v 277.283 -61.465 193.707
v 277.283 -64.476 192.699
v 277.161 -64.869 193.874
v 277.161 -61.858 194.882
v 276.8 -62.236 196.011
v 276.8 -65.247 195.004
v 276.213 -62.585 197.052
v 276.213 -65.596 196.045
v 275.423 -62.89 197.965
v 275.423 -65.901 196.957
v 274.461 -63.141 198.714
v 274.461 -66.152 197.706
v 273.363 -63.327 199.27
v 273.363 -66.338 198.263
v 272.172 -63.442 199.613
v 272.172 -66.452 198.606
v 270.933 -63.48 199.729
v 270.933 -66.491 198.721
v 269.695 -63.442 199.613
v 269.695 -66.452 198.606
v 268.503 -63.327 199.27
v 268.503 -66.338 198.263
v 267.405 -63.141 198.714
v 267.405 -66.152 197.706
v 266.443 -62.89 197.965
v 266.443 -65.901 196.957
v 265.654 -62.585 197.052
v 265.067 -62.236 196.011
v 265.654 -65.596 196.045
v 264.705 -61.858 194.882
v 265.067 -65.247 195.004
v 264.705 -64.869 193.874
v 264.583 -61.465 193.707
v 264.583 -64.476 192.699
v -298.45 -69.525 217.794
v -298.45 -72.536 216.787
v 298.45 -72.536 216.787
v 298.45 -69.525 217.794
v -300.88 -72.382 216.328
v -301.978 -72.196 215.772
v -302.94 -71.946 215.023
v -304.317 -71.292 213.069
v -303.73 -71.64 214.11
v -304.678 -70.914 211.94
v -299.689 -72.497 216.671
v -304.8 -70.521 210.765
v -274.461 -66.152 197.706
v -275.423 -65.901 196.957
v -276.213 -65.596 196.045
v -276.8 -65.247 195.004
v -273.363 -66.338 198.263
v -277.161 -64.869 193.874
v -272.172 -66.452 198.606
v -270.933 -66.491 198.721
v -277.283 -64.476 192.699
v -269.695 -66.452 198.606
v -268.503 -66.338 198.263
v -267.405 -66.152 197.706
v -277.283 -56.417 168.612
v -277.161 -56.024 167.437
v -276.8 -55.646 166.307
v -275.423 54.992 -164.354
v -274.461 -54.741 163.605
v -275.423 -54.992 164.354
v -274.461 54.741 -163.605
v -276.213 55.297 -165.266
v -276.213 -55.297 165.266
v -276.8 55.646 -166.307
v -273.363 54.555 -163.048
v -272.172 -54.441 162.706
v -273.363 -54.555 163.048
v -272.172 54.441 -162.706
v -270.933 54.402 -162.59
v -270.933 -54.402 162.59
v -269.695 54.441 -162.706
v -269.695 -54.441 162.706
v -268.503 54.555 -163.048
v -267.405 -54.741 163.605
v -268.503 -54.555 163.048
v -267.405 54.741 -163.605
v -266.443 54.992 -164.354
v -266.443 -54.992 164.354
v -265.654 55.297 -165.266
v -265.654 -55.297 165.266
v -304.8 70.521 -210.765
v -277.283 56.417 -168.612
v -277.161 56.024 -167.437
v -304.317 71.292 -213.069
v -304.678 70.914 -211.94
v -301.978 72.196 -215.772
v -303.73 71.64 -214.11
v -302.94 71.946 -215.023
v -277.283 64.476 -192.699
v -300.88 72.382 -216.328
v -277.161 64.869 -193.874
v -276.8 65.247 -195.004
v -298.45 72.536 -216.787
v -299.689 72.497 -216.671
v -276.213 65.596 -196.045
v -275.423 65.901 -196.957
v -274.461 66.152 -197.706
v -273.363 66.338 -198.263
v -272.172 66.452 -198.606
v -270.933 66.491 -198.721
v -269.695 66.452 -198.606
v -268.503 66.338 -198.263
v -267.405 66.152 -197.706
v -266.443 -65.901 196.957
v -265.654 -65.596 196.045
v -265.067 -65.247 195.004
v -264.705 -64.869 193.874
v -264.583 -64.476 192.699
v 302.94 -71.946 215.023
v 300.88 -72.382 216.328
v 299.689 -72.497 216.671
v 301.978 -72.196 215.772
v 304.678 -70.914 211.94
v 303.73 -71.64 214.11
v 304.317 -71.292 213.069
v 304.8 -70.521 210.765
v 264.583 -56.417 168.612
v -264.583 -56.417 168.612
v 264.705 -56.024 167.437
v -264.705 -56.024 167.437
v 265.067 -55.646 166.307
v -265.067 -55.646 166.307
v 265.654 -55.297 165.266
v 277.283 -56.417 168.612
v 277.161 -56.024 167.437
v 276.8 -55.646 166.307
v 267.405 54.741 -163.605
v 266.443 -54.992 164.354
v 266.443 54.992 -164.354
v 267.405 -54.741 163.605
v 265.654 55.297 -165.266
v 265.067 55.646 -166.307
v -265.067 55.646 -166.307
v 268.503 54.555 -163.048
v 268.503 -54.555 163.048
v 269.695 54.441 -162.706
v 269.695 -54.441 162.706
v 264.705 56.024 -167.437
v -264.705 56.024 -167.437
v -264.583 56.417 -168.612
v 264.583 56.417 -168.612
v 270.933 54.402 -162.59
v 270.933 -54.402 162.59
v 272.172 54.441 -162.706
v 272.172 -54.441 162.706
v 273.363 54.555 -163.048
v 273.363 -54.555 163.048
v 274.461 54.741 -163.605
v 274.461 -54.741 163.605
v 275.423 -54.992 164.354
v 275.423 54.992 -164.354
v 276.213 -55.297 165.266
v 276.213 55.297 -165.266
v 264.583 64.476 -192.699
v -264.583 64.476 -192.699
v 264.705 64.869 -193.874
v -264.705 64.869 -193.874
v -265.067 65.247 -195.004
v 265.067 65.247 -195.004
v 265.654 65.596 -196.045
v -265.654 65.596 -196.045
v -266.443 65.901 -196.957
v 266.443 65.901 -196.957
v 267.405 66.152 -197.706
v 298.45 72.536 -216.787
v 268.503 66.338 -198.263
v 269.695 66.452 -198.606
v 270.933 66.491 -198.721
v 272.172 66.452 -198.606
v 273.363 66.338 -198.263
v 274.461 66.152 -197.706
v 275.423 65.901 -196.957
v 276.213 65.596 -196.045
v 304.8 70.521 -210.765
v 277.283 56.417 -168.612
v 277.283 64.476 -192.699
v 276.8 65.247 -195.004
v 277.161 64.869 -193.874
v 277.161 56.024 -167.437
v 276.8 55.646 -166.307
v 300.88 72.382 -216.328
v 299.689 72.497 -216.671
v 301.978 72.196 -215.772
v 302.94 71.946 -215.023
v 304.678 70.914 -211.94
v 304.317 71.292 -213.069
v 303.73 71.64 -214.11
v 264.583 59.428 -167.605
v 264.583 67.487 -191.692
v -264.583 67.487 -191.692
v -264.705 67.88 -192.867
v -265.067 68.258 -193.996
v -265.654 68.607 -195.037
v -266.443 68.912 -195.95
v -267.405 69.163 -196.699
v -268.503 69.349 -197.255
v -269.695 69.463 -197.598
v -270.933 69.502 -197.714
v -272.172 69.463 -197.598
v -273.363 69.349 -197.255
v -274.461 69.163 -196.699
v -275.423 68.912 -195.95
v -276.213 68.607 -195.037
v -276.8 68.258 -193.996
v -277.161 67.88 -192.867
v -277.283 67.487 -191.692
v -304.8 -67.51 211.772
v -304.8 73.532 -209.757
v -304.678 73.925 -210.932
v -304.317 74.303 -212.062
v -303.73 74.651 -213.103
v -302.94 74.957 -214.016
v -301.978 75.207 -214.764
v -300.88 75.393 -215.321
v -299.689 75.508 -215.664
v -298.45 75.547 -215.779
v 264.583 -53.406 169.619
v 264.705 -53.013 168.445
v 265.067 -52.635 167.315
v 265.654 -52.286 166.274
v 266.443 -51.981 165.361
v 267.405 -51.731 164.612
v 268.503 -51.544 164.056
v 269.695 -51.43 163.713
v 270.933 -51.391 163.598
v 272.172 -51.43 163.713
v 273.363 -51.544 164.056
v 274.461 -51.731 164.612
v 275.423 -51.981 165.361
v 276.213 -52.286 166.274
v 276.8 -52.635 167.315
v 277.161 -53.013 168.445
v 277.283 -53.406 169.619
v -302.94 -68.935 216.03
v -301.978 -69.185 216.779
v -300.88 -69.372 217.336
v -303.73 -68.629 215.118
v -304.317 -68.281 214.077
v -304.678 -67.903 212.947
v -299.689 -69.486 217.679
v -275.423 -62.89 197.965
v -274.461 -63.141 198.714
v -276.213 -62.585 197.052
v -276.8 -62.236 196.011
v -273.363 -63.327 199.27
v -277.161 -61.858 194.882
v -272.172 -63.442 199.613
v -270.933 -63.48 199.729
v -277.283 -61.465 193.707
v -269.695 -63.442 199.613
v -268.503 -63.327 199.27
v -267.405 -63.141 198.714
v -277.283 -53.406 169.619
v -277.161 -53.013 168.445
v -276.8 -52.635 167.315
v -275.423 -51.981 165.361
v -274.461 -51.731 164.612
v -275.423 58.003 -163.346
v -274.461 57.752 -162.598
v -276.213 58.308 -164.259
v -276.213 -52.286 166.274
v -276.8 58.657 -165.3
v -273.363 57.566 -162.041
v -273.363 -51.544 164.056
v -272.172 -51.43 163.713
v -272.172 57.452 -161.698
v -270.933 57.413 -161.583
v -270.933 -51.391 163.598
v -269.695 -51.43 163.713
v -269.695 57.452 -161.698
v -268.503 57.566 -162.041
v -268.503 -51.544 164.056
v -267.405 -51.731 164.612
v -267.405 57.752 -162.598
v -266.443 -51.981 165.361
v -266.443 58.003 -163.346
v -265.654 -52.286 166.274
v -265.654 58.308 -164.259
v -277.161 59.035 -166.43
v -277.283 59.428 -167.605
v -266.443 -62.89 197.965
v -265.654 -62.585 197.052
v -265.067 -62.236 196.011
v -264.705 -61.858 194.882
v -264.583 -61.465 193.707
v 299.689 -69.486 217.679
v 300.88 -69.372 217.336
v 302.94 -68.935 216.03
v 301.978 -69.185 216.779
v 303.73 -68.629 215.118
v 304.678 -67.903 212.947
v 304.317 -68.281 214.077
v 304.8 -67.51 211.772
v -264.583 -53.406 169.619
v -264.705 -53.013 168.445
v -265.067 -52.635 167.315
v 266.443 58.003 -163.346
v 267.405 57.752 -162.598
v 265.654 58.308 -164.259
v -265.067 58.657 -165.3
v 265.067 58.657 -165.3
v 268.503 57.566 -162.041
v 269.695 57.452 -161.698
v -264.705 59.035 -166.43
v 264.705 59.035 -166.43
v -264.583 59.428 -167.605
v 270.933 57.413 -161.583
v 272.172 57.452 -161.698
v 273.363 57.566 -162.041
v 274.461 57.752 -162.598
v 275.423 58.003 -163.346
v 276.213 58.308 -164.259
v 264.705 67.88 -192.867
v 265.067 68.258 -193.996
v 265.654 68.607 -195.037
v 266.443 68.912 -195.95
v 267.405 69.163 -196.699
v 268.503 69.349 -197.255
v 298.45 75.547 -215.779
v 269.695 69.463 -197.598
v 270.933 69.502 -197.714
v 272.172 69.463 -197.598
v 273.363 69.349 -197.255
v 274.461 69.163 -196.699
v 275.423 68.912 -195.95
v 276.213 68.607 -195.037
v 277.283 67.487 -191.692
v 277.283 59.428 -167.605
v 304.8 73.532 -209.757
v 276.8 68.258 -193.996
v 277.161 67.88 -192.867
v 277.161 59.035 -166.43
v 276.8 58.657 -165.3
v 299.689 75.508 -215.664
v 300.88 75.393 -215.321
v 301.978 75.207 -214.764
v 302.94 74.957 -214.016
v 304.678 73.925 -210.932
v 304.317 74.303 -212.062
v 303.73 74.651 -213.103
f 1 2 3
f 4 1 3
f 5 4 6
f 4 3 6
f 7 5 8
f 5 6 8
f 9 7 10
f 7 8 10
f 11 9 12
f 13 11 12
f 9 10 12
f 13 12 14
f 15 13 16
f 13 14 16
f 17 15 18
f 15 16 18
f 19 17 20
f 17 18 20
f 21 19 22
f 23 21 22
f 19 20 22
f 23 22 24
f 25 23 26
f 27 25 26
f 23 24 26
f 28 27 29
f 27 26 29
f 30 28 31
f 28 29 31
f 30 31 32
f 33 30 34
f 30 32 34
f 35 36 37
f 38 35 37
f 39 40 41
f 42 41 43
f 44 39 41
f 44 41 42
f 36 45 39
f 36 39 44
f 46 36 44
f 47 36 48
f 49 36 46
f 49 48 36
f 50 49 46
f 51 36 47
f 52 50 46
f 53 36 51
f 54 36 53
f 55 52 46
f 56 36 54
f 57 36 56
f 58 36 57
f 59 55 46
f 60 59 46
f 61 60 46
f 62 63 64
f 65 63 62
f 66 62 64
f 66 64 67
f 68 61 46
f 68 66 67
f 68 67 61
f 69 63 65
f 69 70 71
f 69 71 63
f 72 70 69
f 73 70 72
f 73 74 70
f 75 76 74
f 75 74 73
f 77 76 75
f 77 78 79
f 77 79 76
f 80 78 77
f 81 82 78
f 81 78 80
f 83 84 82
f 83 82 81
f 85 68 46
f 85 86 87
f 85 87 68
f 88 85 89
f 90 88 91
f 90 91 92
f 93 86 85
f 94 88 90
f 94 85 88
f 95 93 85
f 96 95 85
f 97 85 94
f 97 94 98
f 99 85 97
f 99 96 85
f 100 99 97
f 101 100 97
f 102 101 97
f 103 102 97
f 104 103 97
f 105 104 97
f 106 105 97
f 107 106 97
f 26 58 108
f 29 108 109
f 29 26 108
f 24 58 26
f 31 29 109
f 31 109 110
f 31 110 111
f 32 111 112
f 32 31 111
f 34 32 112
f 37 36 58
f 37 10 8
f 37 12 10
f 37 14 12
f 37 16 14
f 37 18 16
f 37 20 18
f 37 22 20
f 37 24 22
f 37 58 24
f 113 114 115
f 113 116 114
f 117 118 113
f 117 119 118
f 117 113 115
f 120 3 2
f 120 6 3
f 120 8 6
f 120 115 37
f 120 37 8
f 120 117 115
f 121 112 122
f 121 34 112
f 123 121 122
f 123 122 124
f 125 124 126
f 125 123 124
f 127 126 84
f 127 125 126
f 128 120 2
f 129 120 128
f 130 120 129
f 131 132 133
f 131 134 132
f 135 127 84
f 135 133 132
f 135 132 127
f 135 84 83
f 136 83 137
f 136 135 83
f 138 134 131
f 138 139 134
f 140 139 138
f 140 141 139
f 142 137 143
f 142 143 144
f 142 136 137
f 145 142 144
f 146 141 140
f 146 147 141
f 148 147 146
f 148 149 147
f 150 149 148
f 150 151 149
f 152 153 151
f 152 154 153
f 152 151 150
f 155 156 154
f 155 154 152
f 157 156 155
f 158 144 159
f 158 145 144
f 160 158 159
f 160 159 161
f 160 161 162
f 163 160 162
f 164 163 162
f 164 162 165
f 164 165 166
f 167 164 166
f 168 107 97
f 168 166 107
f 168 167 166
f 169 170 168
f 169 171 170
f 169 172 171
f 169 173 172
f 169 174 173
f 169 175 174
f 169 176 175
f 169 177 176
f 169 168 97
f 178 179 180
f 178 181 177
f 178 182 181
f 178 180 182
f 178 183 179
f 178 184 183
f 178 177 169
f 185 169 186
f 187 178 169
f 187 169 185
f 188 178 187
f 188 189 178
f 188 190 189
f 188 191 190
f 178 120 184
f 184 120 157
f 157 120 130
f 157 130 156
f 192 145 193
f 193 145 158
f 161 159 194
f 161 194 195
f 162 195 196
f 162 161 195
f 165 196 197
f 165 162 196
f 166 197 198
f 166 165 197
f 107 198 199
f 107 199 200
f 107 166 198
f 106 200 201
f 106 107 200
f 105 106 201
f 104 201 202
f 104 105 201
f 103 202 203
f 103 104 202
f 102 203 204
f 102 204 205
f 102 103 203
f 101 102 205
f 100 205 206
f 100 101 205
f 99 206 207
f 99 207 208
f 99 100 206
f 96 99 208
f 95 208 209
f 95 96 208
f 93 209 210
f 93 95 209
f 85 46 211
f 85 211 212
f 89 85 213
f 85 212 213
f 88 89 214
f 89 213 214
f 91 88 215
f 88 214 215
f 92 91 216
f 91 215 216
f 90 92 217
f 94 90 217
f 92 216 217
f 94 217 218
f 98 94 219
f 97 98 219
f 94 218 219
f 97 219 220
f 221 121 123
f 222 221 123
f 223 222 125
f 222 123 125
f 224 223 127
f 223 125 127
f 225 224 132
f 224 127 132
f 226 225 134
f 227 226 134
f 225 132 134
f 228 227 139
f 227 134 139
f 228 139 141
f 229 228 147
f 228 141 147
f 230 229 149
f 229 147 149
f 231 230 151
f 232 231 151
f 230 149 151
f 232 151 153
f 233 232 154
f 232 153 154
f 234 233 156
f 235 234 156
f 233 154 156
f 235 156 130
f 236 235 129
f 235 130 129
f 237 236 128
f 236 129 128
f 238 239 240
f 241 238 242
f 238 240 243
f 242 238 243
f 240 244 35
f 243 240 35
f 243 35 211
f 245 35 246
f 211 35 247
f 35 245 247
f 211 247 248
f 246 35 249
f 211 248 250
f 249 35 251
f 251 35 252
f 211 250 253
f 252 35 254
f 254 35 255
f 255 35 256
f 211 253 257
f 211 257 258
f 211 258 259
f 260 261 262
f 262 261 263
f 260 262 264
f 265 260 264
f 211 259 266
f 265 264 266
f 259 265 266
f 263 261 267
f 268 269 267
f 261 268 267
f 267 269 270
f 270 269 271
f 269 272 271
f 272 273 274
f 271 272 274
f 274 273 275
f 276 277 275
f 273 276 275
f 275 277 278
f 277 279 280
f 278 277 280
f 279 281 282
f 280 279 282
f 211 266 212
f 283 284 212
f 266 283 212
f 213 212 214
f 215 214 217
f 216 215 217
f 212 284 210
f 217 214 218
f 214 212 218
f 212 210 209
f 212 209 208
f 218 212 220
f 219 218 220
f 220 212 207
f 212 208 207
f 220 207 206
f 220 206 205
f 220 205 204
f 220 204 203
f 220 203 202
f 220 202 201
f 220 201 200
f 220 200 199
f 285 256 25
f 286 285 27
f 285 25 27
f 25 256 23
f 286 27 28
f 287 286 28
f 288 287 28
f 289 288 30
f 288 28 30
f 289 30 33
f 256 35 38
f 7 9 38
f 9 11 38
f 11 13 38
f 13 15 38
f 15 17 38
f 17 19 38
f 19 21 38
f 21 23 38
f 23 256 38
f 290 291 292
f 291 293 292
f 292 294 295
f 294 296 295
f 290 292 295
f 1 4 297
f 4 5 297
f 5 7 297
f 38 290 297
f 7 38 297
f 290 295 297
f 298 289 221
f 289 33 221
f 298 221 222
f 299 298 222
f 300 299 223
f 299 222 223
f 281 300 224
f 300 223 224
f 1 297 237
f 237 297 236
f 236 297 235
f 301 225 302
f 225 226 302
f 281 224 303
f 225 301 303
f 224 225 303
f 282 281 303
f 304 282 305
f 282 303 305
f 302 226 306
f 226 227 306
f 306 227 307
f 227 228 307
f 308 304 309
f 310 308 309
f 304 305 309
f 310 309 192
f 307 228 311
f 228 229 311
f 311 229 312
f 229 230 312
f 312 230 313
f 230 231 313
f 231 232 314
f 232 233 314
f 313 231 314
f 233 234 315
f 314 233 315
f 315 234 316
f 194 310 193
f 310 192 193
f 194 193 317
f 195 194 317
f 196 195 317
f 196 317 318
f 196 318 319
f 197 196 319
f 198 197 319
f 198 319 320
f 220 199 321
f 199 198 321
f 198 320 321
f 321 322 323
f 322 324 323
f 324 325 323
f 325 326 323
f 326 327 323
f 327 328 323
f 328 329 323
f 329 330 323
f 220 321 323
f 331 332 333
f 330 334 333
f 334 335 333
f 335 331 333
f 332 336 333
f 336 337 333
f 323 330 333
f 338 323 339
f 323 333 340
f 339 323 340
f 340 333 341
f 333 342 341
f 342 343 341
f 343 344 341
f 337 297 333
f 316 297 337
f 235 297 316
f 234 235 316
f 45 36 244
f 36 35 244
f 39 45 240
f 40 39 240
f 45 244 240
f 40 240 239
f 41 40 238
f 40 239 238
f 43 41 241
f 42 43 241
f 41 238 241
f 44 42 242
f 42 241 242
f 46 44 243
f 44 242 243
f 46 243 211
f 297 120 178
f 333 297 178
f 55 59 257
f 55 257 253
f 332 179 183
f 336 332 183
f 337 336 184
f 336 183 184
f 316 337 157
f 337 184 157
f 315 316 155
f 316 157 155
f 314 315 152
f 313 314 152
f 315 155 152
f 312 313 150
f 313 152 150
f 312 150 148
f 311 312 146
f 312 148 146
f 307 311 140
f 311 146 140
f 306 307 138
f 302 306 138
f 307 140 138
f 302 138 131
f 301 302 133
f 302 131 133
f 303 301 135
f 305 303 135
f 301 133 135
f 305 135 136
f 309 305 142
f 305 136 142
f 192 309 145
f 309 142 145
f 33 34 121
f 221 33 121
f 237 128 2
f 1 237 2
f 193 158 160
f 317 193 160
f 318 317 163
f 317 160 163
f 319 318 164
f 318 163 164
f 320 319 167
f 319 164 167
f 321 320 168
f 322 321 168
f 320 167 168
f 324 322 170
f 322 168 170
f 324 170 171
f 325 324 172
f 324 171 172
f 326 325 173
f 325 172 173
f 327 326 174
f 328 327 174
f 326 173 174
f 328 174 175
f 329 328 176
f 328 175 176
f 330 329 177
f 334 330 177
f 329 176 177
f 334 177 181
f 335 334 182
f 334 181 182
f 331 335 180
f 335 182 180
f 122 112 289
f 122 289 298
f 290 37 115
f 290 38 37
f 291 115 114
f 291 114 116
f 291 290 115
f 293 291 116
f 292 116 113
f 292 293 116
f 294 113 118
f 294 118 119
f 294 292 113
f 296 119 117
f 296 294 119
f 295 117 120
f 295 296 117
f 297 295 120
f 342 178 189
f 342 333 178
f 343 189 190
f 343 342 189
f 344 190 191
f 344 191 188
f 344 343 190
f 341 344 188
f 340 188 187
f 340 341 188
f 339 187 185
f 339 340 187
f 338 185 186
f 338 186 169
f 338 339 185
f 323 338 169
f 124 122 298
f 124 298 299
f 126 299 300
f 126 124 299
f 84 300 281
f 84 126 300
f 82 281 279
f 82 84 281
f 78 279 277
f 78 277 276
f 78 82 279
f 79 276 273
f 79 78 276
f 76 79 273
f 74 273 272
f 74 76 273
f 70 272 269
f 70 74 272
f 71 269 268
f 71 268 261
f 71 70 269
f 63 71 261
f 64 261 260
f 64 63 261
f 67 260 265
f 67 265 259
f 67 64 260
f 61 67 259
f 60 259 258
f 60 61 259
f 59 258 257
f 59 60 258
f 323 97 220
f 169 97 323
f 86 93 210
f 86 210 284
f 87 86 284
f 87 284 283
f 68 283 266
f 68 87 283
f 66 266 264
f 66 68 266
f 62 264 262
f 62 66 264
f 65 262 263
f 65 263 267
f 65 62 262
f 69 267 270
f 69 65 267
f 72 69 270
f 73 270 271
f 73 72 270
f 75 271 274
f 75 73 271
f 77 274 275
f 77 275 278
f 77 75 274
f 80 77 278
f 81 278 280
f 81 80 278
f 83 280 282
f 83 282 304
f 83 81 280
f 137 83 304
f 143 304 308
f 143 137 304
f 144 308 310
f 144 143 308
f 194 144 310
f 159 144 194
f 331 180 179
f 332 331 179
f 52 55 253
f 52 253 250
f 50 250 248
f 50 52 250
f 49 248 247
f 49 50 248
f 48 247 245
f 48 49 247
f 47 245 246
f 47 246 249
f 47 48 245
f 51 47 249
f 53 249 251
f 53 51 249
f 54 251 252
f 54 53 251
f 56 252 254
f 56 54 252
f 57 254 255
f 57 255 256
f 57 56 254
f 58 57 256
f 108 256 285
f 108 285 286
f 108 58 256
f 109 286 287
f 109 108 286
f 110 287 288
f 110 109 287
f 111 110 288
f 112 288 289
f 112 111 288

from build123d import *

# Parameters (mm, degrees)
SKETCH3_W           = 457.2
SKETCH3_H           = 609.6
BOSS_EXTRUDE1_DEPTH = 3.175
FILLET1_R           = 6.35


with BuildPart() as part:
    # Sketch3 → Boss-Extrude1 (new body)
    with BuildSketch(Plane(origin=(0, 0, 0), x_dir=(0, 0.3173046564050865, -0.9483236552062013), z_dir=(0, -0.9483236552062012, -0.3173046564050864))):
        Rectangle(SKETCH3_W, SKETCH3_H)
        with BuildLine():
            Line((203.2, -277.283333333), (177.8, -277.283333333))
            ThreePointArc((177.8, -277.283333333), (171.45, -270.933333333), (177.8, -264.583333333))
            Line((177.8, -264.583333333), (203.2, -264.583333333))
            ThreePointArc((203.2, -264.583333333), (209.55, -270.933333333), (203.2, -277.283333333))
        make_face(mode=Mode.SUBTRACT)
        with BuildLine():
            Line((-203.2, -264.583333333), (-177.8, -264.583333333))
            ThreePointArc((-177.8, -264.583333333), (-171.45, -270.933333333), (-177.8, -277.283333333))
            Line((-177.8, -277.283333333), (-203.2, -277.283333333))
            ThreePointArc((-203.2, -277.283333333), (-209.55, -270.933333333), (-203.2, -264.583333333))
        make_face(mode=Mode.SUBTRACT)
        with BuildLine():
            Line((203.2, 277.283333333), (177.8, 277.283333333))
            ThreePointArc((177.8, 277.283333333), (171.45, 270.933333333), (177.8, 264.583333333))
            Line((177.8, 264.583333333), (203.2, 264.583333333))
            ThreePointArc((203.2, 264.583333333), (209.55, 270.933333333), (203.2, 277.283333333))
        make_face(mode=Mode.SUBTRACT)
        with BuildLine():
            Line((-203.2, 264.583333333), (-177.8, 264.583333333))
            ThreePointArc((-177.8, 264.583333333), (-171.45, 270.933333333), (-177.8, 277.283333333))
            Line((-177.8, 277.283333333), (-203.2, 277.283333333))
            ThreePointArc((-203.2, 277.283333333), (-209.55, 270.933333333), (-203.2, 264.583333333))
        make_face(mode=Mode.SUBTRACT)
    extrude(amount=-BOSS_EXTRUDE1_DEPTH)

    # Fillet1
    fillet1_edges = [part.edges().sort_by_distance(p)[0] for p in [
        (-304.8, 74.041308257, -216.283066438),
        (-304.8, -71.030380652, 217.290508722),
        (304.8, -71.030380652, 217.290508722),
        (304.8, 74.041308257, -216.283066438),
    ]]
    fillet(fillet1_edges, radius=FILLET1_R)


solid = part.part
